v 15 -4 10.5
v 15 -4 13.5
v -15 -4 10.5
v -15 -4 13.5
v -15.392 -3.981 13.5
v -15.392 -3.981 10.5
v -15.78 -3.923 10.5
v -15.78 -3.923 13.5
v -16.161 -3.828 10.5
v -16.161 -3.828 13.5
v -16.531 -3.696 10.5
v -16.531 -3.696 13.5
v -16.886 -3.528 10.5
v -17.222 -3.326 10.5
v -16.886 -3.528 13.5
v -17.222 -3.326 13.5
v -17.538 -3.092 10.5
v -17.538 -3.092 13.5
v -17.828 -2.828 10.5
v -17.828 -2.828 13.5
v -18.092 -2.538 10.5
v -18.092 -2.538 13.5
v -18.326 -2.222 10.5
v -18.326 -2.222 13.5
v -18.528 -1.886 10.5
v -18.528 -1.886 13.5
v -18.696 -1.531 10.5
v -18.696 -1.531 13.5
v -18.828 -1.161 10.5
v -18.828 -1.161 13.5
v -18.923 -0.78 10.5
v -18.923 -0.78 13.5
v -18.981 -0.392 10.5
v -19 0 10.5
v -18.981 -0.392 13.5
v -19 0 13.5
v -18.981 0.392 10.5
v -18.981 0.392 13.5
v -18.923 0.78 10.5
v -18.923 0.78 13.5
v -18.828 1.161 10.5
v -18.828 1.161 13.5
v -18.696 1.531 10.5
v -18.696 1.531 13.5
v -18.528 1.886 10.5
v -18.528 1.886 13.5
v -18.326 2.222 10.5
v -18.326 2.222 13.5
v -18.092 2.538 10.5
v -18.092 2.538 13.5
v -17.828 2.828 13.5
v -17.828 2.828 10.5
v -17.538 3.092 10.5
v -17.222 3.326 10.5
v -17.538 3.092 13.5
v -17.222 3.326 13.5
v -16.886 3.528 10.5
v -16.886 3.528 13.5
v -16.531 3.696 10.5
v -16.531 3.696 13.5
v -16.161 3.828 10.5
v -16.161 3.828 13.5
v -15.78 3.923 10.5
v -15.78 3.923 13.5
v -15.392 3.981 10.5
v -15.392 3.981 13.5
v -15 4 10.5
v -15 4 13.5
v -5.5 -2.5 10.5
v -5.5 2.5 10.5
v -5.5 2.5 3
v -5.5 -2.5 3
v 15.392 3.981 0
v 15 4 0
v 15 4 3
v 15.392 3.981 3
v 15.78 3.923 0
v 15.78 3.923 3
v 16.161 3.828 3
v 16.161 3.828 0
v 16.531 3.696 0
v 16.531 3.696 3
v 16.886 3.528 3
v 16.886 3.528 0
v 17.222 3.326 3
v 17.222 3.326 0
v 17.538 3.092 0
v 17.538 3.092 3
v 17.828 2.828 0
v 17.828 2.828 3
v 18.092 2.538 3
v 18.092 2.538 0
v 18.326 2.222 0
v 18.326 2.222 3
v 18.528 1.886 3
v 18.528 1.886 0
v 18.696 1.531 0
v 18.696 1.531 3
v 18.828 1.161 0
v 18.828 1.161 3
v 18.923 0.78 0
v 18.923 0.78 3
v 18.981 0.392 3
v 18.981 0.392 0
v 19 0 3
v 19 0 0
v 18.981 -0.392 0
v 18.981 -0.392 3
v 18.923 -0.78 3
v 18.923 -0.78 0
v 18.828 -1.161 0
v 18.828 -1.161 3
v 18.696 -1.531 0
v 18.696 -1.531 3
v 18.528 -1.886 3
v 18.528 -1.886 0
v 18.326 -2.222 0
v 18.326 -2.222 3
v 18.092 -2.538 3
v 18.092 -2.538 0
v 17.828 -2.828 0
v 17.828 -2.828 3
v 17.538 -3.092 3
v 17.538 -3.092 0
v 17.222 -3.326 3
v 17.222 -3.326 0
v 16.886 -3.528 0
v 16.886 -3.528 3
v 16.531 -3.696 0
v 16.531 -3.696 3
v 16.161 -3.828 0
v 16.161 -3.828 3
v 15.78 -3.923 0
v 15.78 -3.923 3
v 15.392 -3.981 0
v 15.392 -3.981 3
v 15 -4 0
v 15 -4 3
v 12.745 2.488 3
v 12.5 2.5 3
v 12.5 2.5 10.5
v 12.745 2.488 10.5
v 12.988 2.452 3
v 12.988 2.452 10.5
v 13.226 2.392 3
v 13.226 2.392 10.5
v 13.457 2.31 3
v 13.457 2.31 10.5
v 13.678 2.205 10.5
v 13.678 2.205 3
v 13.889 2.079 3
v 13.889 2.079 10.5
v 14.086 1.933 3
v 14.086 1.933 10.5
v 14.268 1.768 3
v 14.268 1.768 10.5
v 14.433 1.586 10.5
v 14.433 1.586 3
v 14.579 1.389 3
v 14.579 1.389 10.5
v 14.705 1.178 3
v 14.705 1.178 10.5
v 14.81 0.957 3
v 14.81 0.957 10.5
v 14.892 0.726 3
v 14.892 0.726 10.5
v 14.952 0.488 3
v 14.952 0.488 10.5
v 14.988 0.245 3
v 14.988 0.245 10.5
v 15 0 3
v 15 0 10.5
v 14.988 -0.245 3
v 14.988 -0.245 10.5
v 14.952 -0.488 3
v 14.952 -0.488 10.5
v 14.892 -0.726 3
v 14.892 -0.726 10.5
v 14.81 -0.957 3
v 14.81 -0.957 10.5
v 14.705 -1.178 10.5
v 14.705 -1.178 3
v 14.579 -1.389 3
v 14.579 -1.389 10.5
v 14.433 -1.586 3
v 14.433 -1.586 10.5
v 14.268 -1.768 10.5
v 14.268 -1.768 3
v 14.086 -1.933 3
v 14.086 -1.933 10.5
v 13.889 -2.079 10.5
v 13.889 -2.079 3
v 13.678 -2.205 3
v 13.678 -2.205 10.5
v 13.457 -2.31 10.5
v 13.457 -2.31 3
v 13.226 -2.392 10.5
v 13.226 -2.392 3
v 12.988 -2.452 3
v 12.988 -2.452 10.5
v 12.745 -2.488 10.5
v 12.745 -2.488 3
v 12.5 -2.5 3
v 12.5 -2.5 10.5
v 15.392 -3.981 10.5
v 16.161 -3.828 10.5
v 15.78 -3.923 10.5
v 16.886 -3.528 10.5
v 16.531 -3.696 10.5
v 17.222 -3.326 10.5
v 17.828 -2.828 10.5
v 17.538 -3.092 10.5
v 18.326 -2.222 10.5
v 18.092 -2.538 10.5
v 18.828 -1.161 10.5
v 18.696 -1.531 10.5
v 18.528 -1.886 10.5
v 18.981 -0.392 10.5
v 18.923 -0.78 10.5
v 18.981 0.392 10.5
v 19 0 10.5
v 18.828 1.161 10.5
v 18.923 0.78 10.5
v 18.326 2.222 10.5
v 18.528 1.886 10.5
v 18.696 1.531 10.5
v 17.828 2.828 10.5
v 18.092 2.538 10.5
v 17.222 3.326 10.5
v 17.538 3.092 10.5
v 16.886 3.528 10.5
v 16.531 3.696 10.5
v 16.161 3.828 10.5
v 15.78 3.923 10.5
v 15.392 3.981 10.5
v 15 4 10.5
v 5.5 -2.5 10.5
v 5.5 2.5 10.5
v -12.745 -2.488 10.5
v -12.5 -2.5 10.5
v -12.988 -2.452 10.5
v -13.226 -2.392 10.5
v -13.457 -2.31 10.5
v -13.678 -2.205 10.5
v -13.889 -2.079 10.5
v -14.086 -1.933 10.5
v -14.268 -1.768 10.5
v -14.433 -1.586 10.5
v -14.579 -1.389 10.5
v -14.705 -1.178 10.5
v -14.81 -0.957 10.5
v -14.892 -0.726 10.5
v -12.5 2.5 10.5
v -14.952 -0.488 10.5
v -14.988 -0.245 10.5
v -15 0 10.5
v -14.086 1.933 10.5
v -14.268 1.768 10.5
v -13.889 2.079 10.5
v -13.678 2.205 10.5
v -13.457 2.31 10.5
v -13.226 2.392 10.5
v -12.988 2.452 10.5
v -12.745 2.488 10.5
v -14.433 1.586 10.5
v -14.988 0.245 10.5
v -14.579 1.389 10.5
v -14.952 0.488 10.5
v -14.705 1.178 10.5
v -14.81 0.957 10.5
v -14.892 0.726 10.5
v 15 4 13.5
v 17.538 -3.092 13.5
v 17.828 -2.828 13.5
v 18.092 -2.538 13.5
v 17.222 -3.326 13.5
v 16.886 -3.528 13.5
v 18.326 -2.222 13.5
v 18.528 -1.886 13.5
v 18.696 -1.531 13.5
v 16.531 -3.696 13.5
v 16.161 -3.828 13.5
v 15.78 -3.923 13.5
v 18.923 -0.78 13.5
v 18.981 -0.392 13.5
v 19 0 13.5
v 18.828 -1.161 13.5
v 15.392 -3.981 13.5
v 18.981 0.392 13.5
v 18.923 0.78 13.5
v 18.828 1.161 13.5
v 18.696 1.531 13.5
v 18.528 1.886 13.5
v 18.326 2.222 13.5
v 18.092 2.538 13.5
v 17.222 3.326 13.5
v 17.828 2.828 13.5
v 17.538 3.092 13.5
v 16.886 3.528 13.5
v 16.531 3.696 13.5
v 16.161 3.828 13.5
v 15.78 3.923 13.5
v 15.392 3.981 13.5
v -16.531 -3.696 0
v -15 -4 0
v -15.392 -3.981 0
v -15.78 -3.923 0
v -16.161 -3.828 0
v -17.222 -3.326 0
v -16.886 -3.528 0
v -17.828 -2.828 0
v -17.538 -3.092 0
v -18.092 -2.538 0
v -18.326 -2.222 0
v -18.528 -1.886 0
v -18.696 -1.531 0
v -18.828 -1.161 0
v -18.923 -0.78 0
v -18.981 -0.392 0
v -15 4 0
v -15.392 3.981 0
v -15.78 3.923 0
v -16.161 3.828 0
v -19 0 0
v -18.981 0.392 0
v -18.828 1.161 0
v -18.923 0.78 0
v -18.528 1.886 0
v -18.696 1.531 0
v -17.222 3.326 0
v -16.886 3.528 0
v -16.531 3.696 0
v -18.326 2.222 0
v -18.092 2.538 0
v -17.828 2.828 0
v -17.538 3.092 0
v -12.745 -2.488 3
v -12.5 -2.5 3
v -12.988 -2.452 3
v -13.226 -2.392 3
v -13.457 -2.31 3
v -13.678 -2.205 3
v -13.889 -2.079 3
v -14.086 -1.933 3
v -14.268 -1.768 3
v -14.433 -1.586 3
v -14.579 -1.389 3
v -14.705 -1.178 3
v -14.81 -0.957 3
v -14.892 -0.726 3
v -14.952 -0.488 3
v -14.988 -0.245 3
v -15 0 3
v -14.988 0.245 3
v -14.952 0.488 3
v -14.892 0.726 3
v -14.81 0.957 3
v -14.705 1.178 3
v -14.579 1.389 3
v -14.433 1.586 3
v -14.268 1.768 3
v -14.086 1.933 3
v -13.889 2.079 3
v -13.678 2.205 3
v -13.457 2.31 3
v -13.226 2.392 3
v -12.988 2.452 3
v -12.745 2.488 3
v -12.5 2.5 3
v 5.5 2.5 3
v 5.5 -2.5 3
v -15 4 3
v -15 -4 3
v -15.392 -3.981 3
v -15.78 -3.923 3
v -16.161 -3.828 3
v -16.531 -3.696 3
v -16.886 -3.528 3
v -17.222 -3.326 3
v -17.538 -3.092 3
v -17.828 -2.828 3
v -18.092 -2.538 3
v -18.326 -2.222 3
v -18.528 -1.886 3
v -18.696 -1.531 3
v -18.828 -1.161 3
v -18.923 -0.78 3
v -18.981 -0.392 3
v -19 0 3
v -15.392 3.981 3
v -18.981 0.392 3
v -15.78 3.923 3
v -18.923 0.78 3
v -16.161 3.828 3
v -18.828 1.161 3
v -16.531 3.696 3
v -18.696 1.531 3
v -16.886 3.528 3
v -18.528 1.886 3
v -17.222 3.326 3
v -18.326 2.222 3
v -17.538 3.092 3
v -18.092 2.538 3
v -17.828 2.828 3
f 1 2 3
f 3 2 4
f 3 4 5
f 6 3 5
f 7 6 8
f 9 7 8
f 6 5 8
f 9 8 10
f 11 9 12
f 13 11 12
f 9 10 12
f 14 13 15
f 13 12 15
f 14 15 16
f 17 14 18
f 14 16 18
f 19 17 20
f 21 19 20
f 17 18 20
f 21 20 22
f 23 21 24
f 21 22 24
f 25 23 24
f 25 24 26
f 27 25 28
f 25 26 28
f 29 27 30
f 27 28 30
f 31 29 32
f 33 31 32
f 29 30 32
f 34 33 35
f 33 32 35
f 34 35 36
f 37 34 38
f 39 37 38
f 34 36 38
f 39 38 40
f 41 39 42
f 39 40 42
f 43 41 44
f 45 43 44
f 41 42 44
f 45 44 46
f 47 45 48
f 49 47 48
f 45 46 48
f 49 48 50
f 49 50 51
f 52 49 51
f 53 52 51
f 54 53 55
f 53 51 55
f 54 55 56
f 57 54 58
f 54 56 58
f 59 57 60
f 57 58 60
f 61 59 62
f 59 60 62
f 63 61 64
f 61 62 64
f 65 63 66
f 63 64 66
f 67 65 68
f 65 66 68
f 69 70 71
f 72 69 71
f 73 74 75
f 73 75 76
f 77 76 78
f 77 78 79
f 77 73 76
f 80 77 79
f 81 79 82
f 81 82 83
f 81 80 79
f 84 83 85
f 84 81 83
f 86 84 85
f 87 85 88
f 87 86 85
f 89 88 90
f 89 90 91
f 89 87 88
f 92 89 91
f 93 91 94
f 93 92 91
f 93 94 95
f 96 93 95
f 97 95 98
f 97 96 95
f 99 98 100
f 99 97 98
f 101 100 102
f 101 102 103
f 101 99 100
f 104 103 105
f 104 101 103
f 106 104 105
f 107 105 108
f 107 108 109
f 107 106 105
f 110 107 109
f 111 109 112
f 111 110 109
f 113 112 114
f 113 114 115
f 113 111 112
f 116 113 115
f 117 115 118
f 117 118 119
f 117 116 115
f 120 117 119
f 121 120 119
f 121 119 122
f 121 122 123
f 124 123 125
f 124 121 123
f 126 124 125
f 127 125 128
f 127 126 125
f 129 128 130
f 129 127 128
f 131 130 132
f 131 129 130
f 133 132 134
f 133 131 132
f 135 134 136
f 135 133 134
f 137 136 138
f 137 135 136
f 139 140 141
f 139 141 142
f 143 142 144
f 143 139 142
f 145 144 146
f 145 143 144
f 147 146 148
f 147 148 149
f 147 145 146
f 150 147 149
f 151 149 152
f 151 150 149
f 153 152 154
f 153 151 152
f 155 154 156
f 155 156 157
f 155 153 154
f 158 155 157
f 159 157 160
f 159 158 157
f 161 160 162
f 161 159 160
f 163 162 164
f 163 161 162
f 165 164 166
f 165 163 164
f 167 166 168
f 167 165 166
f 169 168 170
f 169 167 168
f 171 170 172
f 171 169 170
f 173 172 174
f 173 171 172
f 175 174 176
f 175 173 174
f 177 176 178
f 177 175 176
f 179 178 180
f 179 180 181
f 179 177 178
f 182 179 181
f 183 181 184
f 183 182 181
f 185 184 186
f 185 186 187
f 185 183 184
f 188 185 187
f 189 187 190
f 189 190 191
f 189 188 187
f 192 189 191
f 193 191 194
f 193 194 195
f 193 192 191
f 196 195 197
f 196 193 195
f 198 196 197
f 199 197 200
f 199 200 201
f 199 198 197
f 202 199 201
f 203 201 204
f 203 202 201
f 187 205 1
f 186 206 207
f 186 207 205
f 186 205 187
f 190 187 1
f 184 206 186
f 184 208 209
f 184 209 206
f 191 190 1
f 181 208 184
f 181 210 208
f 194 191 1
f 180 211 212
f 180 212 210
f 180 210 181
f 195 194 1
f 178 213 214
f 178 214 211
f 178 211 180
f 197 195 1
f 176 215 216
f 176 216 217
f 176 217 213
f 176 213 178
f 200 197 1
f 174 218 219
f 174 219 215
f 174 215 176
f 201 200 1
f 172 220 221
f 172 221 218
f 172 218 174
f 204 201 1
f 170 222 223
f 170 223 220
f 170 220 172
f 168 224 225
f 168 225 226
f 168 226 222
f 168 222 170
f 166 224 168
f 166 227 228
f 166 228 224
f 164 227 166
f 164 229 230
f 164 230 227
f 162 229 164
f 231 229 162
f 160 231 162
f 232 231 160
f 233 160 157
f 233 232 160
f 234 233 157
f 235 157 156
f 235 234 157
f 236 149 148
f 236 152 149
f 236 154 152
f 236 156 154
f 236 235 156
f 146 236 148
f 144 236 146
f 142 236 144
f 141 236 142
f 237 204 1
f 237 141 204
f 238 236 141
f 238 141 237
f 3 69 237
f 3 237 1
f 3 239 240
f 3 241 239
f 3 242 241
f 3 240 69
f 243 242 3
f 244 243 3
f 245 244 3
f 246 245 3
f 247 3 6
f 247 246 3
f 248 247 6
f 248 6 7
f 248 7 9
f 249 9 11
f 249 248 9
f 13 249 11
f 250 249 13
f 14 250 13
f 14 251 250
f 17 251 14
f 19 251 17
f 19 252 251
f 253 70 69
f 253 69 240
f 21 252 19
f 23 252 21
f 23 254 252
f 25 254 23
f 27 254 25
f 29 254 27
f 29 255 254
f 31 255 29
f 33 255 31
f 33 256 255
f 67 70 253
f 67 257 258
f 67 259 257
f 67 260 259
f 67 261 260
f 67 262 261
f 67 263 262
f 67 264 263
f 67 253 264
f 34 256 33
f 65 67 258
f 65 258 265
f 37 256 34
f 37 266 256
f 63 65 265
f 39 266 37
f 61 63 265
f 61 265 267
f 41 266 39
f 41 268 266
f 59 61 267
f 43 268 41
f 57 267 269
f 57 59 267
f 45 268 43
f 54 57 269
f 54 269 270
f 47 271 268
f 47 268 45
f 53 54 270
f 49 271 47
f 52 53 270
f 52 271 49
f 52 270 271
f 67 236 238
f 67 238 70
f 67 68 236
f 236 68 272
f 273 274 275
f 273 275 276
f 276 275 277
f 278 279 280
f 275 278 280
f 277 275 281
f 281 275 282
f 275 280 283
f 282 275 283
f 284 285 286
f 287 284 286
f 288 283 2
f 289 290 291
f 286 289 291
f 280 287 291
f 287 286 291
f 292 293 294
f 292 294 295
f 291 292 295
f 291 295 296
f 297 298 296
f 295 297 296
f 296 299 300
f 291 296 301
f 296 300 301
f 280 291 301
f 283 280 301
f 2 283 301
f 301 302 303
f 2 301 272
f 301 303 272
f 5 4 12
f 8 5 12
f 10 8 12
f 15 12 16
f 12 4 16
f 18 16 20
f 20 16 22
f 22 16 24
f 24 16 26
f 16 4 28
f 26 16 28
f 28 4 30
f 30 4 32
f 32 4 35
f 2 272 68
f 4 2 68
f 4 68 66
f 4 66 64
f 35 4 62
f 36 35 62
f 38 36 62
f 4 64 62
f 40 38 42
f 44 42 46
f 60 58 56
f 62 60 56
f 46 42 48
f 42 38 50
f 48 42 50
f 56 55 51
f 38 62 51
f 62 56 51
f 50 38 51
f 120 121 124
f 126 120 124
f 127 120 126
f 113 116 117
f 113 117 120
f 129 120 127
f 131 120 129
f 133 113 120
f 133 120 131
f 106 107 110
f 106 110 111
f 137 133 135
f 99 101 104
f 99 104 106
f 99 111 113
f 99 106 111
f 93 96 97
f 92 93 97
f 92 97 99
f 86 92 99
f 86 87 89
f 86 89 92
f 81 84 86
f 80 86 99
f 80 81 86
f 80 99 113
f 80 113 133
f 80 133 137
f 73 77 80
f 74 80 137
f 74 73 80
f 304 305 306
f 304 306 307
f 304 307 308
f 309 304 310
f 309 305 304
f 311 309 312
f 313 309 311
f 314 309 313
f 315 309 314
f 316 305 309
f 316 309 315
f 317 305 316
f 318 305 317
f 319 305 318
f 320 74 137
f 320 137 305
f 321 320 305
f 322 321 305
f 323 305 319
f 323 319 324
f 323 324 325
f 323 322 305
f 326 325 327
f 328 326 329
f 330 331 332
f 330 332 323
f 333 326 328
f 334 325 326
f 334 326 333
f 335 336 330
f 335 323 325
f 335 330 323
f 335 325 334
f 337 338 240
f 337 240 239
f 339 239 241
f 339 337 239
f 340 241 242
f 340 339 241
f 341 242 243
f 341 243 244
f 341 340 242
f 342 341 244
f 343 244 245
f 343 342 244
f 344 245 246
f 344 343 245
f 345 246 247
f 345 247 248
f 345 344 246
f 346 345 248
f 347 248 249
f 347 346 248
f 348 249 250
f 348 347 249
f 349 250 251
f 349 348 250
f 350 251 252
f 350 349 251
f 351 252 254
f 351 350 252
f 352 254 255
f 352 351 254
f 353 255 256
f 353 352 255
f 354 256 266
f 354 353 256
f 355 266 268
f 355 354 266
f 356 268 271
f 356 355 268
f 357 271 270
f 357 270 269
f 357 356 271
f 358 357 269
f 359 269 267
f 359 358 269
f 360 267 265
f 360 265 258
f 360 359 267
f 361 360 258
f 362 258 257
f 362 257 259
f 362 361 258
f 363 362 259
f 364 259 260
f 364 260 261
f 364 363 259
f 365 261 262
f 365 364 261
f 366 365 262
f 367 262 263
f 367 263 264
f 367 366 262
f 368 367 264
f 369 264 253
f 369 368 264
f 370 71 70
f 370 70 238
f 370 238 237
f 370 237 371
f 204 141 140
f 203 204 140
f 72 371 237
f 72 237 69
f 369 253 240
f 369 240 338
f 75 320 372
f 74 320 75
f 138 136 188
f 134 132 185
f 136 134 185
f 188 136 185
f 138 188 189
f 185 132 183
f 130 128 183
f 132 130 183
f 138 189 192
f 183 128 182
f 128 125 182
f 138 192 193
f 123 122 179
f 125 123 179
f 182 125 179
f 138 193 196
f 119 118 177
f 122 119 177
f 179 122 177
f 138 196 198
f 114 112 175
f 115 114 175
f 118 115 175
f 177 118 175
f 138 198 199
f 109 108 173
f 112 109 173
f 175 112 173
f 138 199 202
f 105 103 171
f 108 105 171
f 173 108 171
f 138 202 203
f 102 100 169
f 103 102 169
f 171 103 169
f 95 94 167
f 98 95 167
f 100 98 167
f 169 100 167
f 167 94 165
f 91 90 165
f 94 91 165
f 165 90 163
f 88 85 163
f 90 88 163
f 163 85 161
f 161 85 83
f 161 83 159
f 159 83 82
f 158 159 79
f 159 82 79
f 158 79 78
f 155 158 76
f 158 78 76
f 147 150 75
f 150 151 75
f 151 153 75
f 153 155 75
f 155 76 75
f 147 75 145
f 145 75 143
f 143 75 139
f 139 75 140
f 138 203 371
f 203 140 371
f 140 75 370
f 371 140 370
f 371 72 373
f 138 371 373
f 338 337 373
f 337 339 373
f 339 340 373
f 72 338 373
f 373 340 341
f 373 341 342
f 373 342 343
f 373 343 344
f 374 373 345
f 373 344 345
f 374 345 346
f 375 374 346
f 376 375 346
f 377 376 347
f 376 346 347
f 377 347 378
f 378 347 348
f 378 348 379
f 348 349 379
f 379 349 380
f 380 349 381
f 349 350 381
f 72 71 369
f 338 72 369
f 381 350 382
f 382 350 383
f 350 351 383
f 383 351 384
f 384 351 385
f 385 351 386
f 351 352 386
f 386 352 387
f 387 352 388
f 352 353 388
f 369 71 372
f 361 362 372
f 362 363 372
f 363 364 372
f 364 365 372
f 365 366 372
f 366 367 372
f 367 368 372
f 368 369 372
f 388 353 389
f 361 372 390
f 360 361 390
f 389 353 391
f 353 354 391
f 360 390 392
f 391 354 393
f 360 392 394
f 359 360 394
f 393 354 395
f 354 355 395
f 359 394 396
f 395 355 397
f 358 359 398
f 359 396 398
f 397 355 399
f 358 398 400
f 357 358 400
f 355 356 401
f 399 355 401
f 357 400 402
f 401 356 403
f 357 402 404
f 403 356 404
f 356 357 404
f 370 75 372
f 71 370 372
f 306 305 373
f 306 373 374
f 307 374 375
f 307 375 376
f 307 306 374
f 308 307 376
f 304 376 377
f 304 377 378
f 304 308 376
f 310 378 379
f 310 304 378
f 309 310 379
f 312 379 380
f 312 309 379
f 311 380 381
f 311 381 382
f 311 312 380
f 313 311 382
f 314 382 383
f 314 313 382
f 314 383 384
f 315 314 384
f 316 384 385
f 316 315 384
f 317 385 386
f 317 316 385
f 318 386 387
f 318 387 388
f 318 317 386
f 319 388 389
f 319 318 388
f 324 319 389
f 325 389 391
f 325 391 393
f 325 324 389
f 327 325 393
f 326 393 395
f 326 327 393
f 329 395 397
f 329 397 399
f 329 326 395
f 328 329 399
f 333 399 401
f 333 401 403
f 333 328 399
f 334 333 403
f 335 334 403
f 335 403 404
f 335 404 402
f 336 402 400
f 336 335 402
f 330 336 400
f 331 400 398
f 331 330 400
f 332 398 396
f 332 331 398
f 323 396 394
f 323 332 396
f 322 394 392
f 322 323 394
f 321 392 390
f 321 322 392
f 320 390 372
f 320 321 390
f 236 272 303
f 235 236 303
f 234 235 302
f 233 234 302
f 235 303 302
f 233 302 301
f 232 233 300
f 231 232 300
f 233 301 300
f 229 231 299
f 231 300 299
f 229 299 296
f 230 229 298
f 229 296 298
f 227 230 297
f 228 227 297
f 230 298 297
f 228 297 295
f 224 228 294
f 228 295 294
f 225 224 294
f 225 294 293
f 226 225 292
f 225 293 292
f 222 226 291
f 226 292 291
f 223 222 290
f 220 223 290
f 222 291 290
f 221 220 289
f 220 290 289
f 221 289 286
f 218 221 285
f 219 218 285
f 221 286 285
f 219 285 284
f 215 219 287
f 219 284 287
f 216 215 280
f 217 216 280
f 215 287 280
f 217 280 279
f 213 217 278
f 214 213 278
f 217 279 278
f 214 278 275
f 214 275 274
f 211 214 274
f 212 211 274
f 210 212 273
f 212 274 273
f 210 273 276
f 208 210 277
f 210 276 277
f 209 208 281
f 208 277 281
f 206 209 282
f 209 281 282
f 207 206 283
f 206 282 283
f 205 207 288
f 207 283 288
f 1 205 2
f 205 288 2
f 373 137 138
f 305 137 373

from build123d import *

# Parameters (mm, degrees)
BOSS_EXTRUDE1_DEPTH = 3
BOSS_EXTRUDE2_DEPTH = 7.5
SKETCH6_W           = 7
SKETCH6_H           = 7.5
CUT_EXTRUDE1_DEPTH  = 7.5


with BuildPart() as part:
    # Sketch1 → Boss-Extrude1 (new body)
    with BuildSketch(Plane.XY):
        with BuildLine():
            Line((-15, 4), (15, 4))
            ThreePointArc((15, 4), (19, 0), (15, -4))
            Line((15, -4), (-15, -4))
            ThreePointArc((-15, -4), (-19, 0), (-15, 4))
        make_face()
    boss_extrude1 = extrude(amount=BOSS_EXTRUDE1_DEPTH)

    # Sketch4 → Boss-Extrude2 (add)
    with BuildSketch(Plane.XY.offset(3)):
        with BuildLine():
            Line((-12.5, 2.5), (12.5, 2.5))
            ThreePointArc((12.5, 2.5), (15, 0), (12.5, -2.5))
            Line((12.5, -2.5), (-12.5, -2.5))
            ThreePointArc((-12.5, -2.5), (-15, 0), (-12.5, 2.5))
        make_face()
    extrude(amount=BOSS_EXTRUDE2_DEPTH)

    # Mirror1: Boss-Extrude1 across plane
    add(boss_extrude1.mirror(Plane.XY.offset(6.75)))

    # Sketch6 → Cut-Extrude1 (cut)
    with BuildSketch(Plane(origin=(0, 2.5, 0), x_dir=(1, 0, 0), z_dir=(0, 1, 0))):
        with Locations((-9, -6.75)):
            Rectangle(SKETCH6_W, SKETCH6_H)
        with Locations((9, -6.75)):
            Rectangle(SKETCH6_W, SKETCH6_H)
    extrude(amount=-CUT_EXTRUDE1_DEPTH, mode=Mode.SUBTRACT)


solid = part.part
